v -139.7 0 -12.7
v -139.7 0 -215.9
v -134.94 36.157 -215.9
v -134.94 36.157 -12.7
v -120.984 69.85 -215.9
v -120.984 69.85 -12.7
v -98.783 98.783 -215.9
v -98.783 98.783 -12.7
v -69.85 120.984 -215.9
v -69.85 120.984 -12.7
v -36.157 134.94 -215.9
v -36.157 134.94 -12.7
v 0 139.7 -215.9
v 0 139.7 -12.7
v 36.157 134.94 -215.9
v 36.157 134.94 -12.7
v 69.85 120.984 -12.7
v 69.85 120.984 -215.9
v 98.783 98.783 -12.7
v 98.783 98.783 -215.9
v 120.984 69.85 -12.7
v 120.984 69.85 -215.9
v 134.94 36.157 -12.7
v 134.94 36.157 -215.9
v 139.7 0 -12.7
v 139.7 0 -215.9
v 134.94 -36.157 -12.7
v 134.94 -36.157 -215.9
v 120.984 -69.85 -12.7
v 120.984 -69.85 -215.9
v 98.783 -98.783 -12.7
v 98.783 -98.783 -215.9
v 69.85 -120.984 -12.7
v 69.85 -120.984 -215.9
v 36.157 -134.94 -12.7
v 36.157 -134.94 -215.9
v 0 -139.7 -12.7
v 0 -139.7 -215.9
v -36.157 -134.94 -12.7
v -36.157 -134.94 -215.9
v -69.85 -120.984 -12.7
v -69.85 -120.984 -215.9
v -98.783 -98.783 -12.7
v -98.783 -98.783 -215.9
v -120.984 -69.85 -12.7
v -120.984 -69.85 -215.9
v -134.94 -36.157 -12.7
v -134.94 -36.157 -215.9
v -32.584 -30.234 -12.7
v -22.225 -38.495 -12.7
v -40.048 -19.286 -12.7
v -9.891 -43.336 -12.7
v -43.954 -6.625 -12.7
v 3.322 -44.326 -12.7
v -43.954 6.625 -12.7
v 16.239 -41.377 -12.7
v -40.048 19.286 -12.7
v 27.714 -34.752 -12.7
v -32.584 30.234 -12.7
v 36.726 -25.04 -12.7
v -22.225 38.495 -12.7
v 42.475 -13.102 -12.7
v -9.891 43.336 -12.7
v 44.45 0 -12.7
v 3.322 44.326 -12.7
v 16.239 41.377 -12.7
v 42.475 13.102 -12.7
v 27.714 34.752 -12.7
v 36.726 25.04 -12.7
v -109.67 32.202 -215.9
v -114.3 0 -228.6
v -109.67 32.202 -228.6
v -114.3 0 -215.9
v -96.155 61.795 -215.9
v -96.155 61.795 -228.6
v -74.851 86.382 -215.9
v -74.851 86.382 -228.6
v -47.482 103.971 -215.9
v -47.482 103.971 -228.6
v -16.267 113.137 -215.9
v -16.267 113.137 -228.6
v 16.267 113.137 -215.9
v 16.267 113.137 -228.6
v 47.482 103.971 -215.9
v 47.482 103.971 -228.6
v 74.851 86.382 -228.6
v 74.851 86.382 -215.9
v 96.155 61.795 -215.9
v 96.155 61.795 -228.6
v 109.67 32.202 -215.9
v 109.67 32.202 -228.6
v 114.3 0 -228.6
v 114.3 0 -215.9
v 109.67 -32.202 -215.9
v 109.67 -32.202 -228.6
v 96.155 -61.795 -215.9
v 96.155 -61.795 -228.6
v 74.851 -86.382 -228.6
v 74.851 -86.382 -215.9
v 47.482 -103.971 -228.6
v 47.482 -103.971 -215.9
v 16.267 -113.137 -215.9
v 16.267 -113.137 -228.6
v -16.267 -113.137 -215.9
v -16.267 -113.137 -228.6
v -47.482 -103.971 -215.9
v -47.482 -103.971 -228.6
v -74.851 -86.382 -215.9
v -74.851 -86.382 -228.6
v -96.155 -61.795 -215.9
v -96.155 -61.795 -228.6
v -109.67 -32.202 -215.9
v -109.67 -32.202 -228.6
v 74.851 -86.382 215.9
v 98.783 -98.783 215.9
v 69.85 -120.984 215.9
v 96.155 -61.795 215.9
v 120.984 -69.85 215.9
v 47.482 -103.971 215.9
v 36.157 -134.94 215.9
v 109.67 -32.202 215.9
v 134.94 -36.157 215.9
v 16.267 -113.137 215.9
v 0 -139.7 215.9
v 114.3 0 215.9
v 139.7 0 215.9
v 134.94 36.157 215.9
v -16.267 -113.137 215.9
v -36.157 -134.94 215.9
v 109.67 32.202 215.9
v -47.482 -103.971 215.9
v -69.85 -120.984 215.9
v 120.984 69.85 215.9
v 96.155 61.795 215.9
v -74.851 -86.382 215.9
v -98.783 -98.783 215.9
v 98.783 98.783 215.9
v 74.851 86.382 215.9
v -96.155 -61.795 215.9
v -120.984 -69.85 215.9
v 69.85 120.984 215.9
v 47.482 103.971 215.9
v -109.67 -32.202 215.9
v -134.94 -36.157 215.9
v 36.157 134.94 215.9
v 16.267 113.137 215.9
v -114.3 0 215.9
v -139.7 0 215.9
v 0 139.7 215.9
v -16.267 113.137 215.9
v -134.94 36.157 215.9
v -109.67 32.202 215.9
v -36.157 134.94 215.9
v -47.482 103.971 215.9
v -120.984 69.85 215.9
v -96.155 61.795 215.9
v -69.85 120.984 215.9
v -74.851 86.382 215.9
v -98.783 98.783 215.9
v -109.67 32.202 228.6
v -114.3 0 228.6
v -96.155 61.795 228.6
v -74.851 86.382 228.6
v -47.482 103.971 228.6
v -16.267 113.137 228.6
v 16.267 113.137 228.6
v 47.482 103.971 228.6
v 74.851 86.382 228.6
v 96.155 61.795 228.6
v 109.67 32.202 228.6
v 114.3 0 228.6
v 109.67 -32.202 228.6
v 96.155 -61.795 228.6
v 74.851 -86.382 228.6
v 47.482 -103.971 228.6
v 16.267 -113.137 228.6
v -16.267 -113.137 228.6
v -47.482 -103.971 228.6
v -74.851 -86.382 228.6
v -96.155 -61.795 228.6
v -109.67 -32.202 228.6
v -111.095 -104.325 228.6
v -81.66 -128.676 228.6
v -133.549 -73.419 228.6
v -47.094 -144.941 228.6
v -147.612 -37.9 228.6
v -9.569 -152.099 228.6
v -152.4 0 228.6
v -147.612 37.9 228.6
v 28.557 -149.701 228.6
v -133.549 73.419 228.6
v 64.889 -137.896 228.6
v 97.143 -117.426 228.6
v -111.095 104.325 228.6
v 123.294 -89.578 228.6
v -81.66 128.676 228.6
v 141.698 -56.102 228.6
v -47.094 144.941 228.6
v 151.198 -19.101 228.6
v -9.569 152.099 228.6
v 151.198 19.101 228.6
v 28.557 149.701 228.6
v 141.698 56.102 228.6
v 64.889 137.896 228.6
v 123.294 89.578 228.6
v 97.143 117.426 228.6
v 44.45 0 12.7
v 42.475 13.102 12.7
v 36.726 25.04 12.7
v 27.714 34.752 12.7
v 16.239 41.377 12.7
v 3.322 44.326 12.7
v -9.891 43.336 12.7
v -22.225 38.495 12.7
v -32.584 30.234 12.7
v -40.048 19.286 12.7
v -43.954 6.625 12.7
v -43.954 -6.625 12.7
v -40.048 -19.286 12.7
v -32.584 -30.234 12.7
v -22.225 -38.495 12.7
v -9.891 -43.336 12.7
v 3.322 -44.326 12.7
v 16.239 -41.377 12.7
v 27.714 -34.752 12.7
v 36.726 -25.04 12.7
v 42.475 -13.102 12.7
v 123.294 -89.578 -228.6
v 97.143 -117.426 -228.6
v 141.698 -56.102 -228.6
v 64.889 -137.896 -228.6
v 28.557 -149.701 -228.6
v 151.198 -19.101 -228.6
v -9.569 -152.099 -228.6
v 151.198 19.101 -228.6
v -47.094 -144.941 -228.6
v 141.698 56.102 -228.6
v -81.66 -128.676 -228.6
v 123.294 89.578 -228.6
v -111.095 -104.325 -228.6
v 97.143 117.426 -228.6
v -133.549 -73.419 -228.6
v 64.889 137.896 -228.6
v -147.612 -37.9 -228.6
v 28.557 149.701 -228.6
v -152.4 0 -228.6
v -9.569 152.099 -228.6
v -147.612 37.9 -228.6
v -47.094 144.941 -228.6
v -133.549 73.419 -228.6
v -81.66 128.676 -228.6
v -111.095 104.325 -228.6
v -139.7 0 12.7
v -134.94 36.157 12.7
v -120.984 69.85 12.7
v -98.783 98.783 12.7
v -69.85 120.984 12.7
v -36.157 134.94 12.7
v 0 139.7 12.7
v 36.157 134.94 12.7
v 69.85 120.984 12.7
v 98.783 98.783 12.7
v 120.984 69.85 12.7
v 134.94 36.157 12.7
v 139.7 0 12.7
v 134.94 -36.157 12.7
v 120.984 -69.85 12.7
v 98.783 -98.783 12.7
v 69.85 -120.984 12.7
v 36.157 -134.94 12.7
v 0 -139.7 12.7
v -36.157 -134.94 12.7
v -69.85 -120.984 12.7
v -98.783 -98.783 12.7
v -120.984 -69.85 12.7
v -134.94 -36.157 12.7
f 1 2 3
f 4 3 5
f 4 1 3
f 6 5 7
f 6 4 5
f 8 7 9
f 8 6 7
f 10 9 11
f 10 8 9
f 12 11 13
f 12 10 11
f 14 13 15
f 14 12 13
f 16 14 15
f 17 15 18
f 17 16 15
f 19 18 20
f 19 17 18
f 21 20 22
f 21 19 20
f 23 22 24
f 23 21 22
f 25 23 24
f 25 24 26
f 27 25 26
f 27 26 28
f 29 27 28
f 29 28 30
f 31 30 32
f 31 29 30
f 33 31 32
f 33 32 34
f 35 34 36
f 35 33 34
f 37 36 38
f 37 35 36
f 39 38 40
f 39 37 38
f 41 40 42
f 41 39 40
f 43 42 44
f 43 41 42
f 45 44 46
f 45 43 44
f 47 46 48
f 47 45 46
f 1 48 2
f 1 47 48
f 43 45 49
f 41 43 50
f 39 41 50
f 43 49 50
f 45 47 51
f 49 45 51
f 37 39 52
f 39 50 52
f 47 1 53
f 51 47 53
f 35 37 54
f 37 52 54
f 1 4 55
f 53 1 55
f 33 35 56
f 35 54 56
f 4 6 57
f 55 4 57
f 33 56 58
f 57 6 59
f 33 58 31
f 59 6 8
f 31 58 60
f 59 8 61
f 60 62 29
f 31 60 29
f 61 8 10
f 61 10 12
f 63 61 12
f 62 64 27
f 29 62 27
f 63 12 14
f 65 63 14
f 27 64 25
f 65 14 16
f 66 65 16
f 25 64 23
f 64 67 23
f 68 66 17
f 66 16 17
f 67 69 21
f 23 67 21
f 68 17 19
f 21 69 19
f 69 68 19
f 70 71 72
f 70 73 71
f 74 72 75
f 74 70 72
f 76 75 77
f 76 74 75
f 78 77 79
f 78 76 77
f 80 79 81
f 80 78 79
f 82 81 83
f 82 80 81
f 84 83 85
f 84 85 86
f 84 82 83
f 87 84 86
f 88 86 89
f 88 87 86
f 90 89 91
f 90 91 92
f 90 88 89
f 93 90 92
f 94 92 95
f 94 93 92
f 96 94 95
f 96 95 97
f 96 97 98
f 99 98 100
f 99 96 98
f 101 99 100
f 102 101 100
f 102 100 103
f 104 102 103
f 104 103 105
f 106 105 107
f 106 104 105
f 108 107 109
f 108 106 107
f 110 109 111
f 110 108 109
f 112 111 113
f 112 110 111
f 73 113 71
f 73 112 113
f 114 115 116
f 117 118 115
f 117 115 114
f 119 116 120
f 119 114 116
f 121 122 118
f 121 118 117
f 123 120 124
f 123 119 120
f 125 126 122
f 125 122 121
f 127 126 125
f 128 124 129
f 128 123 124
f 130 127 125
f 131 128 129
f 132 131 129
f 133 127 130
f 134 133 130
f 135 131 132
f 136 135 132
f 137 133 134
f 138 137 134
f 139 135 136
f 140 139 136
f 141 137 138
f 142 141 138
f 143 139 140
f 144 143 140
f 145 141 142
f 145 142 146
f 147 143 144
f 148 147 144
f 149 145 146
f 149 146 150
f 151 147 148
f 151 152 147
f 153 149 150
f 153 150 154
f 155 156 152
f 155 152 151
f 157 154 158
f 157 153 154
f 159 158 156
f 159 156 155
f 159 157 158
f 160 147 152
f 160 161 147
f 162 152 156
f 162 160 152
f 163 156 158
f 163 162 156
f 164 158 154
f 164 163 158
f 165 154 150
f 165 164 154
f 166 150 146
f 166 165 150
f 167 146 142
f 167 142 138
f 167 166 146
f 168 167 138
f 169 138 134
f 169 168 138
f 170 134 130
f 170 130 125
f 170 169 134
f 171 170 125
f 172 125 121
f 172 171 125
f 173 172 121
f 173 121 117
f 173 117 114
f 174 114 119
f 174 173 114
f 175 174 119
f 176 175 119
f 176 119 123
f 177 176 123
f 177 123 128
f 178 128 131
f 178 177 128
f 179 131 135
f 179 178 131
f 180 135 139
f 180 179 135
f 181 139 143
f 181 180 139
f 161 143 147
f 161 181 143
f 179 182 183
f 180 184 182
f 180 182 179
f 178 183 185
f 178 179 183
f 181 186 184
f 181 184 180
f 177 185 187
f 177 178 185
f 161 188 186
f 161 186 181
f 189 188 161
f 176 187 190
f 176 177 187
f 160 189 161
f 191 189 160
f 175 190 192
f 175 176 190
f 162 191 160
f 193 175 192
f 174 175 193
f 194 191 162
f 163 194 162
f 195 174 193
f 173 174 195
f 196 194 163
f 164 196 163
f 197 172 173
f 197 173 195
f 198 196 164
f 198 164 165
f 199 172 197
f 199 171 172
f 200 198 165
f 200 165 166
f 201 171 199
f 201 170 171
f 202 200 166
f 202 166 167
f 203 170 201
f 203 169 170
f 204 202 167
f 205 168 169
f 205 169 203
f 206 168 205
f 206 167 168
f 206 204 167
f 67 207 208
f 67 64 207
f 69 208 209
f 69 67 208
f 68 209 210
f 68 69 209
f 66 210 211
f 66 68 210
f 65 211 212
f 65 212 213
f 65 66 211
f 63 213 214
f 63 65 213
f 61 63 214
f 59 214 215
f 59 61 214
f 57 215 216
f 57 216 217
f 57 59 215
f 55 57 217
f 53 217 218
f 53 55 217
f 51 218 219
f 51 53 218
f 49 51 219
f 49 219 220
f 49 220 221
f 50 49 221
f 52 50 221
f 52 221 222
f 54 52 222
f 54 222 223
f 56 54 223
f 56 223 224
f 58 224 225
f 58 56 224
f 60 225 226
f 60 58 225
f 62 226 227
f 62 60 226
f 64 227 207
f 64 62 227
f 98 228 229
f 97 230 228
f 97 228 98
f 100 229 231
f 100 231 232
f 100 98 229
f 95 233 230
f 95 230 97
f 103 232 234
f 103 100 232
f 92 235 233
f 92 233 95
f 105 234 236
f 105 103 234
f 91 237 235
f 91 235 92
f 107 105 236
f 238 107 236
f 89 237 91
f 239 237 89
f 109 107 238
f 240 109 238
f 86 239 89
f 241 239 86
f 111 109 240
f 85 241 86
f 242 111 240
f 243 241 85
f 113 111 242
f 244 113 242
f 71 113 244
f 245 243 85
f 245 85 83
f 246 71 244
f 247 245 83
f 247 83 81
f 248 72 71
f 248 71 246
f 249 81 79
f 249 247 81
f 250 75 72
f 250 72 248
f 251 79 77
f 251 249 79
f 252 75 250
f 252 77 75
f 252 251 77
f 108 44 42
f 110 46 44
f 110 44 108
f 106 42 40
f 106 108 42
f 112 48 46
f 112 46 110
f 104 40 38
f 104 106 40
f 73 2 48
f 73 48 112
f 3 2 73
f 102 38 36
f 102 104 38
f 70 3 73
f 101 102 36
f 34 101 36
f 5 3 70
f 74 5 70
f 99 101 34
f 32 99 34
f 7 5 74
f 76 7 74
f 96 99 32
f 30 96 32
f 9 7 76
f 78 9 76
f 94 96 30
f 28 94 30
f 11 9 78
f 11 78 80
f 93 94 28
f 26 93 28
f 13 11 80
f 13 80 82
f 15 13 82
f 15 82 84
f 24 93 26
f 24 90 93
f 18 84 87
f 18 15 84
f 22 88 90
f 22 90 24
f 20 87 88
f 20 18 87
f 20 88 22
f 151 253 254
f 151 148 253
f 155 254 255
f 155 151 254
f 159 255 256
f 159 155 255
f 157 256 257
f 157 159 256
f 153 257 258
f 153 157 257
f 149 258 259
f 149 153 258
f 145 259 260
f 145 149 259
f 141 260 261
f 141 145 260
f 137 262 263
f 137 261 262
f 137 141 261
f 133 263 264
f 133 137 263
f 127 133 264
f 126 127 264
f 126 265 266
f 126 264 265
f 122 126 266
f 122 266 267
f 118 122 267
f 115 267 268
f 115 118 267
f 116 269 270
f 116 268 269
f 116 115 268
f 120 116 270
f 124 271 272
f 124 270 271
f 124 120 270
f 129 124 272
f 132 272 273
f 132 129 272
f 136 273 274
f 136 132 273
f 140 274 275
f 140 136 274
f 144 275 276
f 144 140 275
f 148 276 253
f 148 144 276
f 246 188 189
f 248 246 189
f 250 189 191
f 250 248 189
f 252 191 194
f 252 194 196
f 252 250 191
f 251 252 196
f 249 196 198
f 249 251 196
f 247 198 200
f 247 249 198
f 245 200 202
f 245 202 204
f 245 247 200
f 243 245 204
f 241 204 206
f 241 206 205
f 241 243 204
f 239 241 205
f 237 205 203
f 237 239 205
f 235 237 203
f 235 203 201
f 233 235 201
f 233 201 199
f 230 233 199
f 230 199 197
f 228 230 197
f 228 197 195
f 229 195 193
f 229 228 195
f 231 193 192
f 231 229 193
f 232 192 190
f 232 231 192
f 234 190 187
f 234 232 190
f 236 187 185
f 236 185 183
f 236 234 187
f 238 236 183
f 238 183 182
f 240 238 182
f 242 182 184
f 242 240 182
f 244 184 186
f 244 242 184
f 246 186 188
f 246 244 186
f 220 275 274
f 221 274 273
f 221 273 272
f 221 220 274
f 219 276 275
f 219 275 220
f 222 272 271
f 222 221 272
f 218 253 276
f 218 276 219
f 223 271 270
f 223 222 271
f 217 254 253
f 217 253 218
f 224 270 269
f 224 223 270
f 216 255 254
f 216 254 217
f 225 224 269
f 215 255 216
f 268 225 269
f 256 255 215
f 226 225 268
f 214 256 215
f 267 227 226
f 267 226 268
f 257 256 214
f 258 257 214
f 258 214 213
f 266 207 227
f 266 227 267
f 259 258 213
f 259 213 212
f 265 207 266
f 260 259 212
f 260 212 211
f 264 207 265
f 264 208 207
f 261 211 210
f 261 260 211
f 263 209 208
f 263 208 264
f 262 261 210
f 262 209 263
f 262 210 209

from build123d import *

# Parameters (mm, degrees)
F2_R     = 152.4
F2_R_2   = 44.45
F3_DEPTH = 6.35
F4_DEPTH = 12.7


with BuildPart() as f1:
    # F0 (on Front) → F1 (revolve)
    with BuildSketch(Plane.XZ):
        Polygon((-114.3, 215.9), (-114.3, 228.6), (-152.4, 228.6), (-152.4, -228.6), (-114.3, -228.6), (-114.3, -215.9), (-139.7, -215.9), (-139.7, 215.9), align=None)
    revolve(axis=Axis((0, 0, 0), (0, 0, -1)))

    # F2 (on Top) → F3 (join, symmetric)
    with BuildSketch(Plane.XY):
        Circle(F2_R)
        Circle(F2_R_2, mode=Mode.SUBTRACT)
    extrude(amount=F3_DEPTH, both=True)

    # F2 (on Top) → F4 (join, symmetric)
    with BuildSketch(Plane.XY):
        Circle(F2_R)
        Circle(F2_R_2, mode=Mode.SUBTRACT)
    extrude(amount=F4_DEPTH, both=True)


solid = f1.part
